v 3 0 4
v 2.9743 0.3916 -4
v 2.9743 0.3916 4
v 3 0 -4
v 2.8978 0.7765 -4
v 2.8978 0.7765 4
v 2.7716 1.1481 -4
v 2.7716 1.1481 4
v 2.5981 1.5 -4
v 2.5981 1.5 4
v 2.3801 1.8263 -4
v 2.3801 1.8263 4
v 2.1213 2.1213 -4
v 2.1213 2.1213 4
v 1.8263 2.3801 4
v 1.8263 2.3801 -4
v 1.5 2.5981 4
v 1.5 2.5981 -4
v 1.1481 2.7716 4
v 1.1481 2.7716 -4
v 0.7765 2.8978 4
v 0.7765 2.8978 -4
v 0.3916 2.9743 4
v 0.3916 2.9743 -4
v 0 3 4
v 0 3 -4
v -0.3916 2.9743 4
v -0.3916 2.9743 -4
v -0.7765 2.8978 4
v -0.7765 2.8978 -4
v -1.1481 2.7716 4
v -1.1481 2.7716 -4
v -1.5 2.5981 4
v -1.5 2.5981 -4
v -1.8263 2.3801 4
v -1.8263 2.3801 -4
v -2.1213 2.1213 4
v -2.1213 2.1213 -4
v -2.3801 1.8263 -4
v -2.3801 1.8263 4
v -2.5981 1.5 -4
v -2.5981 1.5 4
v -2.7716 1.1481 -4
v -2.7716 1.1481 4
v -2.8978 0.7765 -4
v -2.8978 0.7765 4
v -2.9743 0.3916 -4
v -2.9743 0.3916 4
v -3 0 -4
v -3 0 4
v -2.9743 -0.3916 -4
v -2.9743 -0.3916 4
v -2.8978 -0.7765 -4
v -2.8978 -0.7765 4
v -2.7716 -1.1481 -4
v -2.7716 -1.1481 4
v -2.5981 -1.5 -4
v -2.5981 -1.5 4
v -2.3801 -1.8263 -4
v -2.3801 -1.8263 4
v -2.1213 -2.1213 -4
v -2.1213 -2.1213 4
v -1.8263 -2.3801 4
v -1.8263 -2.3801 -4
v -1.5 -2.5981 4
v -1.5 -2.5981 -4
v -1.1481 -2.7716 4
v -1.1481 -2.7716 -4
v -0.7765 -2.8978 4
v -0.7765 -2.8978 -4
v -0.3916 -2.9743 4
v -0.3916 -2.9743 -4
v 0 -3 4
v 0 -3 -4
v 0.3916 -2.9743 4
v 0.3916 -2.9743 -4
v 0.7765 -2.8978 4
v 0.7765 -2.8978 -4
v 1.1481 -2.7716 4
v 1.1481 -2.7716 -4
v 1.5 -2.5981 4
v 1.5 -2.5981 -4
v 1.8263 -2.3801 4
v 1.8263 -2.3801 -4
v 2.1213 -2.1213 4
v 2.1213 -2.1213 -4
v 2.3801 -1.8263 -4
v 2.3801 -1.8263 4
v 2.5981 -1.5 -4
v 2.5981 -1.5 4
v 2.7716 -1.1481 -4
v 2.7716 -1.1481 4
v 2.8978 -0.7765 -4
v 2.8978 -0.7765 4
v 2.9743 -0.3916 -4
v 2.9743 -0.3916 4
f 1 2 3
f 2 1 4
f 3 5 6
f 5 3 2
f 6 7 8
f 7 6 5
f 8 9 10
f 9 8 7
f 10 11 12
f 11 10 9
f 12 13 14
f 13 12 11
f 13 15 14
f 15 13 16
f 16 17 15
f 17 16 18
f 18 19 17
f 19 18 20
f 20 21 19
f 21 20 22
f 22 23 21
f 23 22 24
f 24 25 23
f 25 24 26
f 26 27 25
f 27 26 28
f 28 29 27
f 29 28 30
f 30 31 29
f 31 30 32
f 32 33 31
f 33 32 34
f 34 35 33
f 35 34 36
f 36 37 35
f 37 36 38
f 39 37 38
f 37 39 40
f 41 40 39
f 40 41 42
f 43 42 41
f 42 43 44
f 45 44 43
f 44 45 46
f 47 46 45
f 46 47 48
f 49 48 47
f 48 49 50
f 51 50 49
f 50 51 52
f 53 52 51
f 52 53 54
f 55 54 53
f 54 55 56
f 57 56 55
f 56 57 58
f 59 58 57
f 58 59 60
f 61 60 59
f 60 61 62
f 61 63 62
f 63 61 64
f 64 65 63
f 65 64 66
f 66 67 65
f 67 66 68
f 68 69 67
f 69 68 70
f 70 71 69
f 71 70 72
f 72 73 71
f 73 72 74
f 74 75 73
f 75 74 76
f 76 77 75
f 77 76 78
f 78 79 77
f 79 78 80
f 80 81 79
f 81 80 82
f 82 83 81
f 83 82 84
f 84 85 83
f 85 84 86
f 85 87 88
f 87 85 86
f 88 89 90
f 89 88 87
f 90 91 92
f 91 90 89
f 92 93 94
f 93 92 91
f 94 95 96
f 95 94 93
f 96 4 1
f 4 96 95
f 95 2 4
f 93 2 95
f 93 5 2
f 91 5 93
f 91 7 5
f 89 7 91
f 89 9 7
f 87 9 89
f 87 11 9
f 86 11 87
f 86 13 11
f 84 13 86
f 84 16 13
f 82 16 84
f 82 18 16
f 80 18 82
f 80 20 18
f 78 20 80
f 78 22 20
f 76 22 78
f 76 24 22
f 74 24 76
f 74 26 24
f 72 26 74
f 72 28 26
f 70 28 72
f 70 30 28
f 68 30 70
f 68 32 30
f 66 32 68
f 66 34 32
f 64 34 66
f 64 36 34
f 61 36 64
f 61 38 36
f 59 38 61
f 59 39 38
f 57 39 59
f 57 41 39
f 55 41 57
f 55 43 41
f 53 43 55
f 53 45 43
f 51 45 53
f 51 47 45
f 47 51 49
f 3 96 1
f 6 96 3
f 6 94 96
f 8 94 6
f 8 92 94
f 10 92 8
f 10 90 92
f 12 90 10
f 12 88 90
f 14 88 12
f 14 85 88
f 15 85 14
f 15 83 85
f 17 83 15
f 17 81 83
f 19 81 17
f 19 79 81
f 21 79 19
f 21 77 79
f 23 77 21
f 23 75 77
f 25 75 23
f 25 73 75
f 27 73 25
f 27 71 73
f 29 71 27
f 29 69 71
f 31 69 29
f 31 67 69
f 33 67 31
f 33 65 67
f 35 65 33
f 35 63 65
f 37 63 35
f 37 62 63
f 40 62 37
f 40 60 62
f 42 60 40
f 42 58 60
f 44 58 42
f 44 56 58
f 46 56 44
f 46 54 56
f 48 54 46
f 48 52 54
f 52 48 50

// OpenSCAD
height = 8;
radius_bottom = 3;
radius_top = 3;
centered = true;
$fn = 48;

cylinder(h = height, r1 = radius_bottom, r2 = radius_top, center = centered);
